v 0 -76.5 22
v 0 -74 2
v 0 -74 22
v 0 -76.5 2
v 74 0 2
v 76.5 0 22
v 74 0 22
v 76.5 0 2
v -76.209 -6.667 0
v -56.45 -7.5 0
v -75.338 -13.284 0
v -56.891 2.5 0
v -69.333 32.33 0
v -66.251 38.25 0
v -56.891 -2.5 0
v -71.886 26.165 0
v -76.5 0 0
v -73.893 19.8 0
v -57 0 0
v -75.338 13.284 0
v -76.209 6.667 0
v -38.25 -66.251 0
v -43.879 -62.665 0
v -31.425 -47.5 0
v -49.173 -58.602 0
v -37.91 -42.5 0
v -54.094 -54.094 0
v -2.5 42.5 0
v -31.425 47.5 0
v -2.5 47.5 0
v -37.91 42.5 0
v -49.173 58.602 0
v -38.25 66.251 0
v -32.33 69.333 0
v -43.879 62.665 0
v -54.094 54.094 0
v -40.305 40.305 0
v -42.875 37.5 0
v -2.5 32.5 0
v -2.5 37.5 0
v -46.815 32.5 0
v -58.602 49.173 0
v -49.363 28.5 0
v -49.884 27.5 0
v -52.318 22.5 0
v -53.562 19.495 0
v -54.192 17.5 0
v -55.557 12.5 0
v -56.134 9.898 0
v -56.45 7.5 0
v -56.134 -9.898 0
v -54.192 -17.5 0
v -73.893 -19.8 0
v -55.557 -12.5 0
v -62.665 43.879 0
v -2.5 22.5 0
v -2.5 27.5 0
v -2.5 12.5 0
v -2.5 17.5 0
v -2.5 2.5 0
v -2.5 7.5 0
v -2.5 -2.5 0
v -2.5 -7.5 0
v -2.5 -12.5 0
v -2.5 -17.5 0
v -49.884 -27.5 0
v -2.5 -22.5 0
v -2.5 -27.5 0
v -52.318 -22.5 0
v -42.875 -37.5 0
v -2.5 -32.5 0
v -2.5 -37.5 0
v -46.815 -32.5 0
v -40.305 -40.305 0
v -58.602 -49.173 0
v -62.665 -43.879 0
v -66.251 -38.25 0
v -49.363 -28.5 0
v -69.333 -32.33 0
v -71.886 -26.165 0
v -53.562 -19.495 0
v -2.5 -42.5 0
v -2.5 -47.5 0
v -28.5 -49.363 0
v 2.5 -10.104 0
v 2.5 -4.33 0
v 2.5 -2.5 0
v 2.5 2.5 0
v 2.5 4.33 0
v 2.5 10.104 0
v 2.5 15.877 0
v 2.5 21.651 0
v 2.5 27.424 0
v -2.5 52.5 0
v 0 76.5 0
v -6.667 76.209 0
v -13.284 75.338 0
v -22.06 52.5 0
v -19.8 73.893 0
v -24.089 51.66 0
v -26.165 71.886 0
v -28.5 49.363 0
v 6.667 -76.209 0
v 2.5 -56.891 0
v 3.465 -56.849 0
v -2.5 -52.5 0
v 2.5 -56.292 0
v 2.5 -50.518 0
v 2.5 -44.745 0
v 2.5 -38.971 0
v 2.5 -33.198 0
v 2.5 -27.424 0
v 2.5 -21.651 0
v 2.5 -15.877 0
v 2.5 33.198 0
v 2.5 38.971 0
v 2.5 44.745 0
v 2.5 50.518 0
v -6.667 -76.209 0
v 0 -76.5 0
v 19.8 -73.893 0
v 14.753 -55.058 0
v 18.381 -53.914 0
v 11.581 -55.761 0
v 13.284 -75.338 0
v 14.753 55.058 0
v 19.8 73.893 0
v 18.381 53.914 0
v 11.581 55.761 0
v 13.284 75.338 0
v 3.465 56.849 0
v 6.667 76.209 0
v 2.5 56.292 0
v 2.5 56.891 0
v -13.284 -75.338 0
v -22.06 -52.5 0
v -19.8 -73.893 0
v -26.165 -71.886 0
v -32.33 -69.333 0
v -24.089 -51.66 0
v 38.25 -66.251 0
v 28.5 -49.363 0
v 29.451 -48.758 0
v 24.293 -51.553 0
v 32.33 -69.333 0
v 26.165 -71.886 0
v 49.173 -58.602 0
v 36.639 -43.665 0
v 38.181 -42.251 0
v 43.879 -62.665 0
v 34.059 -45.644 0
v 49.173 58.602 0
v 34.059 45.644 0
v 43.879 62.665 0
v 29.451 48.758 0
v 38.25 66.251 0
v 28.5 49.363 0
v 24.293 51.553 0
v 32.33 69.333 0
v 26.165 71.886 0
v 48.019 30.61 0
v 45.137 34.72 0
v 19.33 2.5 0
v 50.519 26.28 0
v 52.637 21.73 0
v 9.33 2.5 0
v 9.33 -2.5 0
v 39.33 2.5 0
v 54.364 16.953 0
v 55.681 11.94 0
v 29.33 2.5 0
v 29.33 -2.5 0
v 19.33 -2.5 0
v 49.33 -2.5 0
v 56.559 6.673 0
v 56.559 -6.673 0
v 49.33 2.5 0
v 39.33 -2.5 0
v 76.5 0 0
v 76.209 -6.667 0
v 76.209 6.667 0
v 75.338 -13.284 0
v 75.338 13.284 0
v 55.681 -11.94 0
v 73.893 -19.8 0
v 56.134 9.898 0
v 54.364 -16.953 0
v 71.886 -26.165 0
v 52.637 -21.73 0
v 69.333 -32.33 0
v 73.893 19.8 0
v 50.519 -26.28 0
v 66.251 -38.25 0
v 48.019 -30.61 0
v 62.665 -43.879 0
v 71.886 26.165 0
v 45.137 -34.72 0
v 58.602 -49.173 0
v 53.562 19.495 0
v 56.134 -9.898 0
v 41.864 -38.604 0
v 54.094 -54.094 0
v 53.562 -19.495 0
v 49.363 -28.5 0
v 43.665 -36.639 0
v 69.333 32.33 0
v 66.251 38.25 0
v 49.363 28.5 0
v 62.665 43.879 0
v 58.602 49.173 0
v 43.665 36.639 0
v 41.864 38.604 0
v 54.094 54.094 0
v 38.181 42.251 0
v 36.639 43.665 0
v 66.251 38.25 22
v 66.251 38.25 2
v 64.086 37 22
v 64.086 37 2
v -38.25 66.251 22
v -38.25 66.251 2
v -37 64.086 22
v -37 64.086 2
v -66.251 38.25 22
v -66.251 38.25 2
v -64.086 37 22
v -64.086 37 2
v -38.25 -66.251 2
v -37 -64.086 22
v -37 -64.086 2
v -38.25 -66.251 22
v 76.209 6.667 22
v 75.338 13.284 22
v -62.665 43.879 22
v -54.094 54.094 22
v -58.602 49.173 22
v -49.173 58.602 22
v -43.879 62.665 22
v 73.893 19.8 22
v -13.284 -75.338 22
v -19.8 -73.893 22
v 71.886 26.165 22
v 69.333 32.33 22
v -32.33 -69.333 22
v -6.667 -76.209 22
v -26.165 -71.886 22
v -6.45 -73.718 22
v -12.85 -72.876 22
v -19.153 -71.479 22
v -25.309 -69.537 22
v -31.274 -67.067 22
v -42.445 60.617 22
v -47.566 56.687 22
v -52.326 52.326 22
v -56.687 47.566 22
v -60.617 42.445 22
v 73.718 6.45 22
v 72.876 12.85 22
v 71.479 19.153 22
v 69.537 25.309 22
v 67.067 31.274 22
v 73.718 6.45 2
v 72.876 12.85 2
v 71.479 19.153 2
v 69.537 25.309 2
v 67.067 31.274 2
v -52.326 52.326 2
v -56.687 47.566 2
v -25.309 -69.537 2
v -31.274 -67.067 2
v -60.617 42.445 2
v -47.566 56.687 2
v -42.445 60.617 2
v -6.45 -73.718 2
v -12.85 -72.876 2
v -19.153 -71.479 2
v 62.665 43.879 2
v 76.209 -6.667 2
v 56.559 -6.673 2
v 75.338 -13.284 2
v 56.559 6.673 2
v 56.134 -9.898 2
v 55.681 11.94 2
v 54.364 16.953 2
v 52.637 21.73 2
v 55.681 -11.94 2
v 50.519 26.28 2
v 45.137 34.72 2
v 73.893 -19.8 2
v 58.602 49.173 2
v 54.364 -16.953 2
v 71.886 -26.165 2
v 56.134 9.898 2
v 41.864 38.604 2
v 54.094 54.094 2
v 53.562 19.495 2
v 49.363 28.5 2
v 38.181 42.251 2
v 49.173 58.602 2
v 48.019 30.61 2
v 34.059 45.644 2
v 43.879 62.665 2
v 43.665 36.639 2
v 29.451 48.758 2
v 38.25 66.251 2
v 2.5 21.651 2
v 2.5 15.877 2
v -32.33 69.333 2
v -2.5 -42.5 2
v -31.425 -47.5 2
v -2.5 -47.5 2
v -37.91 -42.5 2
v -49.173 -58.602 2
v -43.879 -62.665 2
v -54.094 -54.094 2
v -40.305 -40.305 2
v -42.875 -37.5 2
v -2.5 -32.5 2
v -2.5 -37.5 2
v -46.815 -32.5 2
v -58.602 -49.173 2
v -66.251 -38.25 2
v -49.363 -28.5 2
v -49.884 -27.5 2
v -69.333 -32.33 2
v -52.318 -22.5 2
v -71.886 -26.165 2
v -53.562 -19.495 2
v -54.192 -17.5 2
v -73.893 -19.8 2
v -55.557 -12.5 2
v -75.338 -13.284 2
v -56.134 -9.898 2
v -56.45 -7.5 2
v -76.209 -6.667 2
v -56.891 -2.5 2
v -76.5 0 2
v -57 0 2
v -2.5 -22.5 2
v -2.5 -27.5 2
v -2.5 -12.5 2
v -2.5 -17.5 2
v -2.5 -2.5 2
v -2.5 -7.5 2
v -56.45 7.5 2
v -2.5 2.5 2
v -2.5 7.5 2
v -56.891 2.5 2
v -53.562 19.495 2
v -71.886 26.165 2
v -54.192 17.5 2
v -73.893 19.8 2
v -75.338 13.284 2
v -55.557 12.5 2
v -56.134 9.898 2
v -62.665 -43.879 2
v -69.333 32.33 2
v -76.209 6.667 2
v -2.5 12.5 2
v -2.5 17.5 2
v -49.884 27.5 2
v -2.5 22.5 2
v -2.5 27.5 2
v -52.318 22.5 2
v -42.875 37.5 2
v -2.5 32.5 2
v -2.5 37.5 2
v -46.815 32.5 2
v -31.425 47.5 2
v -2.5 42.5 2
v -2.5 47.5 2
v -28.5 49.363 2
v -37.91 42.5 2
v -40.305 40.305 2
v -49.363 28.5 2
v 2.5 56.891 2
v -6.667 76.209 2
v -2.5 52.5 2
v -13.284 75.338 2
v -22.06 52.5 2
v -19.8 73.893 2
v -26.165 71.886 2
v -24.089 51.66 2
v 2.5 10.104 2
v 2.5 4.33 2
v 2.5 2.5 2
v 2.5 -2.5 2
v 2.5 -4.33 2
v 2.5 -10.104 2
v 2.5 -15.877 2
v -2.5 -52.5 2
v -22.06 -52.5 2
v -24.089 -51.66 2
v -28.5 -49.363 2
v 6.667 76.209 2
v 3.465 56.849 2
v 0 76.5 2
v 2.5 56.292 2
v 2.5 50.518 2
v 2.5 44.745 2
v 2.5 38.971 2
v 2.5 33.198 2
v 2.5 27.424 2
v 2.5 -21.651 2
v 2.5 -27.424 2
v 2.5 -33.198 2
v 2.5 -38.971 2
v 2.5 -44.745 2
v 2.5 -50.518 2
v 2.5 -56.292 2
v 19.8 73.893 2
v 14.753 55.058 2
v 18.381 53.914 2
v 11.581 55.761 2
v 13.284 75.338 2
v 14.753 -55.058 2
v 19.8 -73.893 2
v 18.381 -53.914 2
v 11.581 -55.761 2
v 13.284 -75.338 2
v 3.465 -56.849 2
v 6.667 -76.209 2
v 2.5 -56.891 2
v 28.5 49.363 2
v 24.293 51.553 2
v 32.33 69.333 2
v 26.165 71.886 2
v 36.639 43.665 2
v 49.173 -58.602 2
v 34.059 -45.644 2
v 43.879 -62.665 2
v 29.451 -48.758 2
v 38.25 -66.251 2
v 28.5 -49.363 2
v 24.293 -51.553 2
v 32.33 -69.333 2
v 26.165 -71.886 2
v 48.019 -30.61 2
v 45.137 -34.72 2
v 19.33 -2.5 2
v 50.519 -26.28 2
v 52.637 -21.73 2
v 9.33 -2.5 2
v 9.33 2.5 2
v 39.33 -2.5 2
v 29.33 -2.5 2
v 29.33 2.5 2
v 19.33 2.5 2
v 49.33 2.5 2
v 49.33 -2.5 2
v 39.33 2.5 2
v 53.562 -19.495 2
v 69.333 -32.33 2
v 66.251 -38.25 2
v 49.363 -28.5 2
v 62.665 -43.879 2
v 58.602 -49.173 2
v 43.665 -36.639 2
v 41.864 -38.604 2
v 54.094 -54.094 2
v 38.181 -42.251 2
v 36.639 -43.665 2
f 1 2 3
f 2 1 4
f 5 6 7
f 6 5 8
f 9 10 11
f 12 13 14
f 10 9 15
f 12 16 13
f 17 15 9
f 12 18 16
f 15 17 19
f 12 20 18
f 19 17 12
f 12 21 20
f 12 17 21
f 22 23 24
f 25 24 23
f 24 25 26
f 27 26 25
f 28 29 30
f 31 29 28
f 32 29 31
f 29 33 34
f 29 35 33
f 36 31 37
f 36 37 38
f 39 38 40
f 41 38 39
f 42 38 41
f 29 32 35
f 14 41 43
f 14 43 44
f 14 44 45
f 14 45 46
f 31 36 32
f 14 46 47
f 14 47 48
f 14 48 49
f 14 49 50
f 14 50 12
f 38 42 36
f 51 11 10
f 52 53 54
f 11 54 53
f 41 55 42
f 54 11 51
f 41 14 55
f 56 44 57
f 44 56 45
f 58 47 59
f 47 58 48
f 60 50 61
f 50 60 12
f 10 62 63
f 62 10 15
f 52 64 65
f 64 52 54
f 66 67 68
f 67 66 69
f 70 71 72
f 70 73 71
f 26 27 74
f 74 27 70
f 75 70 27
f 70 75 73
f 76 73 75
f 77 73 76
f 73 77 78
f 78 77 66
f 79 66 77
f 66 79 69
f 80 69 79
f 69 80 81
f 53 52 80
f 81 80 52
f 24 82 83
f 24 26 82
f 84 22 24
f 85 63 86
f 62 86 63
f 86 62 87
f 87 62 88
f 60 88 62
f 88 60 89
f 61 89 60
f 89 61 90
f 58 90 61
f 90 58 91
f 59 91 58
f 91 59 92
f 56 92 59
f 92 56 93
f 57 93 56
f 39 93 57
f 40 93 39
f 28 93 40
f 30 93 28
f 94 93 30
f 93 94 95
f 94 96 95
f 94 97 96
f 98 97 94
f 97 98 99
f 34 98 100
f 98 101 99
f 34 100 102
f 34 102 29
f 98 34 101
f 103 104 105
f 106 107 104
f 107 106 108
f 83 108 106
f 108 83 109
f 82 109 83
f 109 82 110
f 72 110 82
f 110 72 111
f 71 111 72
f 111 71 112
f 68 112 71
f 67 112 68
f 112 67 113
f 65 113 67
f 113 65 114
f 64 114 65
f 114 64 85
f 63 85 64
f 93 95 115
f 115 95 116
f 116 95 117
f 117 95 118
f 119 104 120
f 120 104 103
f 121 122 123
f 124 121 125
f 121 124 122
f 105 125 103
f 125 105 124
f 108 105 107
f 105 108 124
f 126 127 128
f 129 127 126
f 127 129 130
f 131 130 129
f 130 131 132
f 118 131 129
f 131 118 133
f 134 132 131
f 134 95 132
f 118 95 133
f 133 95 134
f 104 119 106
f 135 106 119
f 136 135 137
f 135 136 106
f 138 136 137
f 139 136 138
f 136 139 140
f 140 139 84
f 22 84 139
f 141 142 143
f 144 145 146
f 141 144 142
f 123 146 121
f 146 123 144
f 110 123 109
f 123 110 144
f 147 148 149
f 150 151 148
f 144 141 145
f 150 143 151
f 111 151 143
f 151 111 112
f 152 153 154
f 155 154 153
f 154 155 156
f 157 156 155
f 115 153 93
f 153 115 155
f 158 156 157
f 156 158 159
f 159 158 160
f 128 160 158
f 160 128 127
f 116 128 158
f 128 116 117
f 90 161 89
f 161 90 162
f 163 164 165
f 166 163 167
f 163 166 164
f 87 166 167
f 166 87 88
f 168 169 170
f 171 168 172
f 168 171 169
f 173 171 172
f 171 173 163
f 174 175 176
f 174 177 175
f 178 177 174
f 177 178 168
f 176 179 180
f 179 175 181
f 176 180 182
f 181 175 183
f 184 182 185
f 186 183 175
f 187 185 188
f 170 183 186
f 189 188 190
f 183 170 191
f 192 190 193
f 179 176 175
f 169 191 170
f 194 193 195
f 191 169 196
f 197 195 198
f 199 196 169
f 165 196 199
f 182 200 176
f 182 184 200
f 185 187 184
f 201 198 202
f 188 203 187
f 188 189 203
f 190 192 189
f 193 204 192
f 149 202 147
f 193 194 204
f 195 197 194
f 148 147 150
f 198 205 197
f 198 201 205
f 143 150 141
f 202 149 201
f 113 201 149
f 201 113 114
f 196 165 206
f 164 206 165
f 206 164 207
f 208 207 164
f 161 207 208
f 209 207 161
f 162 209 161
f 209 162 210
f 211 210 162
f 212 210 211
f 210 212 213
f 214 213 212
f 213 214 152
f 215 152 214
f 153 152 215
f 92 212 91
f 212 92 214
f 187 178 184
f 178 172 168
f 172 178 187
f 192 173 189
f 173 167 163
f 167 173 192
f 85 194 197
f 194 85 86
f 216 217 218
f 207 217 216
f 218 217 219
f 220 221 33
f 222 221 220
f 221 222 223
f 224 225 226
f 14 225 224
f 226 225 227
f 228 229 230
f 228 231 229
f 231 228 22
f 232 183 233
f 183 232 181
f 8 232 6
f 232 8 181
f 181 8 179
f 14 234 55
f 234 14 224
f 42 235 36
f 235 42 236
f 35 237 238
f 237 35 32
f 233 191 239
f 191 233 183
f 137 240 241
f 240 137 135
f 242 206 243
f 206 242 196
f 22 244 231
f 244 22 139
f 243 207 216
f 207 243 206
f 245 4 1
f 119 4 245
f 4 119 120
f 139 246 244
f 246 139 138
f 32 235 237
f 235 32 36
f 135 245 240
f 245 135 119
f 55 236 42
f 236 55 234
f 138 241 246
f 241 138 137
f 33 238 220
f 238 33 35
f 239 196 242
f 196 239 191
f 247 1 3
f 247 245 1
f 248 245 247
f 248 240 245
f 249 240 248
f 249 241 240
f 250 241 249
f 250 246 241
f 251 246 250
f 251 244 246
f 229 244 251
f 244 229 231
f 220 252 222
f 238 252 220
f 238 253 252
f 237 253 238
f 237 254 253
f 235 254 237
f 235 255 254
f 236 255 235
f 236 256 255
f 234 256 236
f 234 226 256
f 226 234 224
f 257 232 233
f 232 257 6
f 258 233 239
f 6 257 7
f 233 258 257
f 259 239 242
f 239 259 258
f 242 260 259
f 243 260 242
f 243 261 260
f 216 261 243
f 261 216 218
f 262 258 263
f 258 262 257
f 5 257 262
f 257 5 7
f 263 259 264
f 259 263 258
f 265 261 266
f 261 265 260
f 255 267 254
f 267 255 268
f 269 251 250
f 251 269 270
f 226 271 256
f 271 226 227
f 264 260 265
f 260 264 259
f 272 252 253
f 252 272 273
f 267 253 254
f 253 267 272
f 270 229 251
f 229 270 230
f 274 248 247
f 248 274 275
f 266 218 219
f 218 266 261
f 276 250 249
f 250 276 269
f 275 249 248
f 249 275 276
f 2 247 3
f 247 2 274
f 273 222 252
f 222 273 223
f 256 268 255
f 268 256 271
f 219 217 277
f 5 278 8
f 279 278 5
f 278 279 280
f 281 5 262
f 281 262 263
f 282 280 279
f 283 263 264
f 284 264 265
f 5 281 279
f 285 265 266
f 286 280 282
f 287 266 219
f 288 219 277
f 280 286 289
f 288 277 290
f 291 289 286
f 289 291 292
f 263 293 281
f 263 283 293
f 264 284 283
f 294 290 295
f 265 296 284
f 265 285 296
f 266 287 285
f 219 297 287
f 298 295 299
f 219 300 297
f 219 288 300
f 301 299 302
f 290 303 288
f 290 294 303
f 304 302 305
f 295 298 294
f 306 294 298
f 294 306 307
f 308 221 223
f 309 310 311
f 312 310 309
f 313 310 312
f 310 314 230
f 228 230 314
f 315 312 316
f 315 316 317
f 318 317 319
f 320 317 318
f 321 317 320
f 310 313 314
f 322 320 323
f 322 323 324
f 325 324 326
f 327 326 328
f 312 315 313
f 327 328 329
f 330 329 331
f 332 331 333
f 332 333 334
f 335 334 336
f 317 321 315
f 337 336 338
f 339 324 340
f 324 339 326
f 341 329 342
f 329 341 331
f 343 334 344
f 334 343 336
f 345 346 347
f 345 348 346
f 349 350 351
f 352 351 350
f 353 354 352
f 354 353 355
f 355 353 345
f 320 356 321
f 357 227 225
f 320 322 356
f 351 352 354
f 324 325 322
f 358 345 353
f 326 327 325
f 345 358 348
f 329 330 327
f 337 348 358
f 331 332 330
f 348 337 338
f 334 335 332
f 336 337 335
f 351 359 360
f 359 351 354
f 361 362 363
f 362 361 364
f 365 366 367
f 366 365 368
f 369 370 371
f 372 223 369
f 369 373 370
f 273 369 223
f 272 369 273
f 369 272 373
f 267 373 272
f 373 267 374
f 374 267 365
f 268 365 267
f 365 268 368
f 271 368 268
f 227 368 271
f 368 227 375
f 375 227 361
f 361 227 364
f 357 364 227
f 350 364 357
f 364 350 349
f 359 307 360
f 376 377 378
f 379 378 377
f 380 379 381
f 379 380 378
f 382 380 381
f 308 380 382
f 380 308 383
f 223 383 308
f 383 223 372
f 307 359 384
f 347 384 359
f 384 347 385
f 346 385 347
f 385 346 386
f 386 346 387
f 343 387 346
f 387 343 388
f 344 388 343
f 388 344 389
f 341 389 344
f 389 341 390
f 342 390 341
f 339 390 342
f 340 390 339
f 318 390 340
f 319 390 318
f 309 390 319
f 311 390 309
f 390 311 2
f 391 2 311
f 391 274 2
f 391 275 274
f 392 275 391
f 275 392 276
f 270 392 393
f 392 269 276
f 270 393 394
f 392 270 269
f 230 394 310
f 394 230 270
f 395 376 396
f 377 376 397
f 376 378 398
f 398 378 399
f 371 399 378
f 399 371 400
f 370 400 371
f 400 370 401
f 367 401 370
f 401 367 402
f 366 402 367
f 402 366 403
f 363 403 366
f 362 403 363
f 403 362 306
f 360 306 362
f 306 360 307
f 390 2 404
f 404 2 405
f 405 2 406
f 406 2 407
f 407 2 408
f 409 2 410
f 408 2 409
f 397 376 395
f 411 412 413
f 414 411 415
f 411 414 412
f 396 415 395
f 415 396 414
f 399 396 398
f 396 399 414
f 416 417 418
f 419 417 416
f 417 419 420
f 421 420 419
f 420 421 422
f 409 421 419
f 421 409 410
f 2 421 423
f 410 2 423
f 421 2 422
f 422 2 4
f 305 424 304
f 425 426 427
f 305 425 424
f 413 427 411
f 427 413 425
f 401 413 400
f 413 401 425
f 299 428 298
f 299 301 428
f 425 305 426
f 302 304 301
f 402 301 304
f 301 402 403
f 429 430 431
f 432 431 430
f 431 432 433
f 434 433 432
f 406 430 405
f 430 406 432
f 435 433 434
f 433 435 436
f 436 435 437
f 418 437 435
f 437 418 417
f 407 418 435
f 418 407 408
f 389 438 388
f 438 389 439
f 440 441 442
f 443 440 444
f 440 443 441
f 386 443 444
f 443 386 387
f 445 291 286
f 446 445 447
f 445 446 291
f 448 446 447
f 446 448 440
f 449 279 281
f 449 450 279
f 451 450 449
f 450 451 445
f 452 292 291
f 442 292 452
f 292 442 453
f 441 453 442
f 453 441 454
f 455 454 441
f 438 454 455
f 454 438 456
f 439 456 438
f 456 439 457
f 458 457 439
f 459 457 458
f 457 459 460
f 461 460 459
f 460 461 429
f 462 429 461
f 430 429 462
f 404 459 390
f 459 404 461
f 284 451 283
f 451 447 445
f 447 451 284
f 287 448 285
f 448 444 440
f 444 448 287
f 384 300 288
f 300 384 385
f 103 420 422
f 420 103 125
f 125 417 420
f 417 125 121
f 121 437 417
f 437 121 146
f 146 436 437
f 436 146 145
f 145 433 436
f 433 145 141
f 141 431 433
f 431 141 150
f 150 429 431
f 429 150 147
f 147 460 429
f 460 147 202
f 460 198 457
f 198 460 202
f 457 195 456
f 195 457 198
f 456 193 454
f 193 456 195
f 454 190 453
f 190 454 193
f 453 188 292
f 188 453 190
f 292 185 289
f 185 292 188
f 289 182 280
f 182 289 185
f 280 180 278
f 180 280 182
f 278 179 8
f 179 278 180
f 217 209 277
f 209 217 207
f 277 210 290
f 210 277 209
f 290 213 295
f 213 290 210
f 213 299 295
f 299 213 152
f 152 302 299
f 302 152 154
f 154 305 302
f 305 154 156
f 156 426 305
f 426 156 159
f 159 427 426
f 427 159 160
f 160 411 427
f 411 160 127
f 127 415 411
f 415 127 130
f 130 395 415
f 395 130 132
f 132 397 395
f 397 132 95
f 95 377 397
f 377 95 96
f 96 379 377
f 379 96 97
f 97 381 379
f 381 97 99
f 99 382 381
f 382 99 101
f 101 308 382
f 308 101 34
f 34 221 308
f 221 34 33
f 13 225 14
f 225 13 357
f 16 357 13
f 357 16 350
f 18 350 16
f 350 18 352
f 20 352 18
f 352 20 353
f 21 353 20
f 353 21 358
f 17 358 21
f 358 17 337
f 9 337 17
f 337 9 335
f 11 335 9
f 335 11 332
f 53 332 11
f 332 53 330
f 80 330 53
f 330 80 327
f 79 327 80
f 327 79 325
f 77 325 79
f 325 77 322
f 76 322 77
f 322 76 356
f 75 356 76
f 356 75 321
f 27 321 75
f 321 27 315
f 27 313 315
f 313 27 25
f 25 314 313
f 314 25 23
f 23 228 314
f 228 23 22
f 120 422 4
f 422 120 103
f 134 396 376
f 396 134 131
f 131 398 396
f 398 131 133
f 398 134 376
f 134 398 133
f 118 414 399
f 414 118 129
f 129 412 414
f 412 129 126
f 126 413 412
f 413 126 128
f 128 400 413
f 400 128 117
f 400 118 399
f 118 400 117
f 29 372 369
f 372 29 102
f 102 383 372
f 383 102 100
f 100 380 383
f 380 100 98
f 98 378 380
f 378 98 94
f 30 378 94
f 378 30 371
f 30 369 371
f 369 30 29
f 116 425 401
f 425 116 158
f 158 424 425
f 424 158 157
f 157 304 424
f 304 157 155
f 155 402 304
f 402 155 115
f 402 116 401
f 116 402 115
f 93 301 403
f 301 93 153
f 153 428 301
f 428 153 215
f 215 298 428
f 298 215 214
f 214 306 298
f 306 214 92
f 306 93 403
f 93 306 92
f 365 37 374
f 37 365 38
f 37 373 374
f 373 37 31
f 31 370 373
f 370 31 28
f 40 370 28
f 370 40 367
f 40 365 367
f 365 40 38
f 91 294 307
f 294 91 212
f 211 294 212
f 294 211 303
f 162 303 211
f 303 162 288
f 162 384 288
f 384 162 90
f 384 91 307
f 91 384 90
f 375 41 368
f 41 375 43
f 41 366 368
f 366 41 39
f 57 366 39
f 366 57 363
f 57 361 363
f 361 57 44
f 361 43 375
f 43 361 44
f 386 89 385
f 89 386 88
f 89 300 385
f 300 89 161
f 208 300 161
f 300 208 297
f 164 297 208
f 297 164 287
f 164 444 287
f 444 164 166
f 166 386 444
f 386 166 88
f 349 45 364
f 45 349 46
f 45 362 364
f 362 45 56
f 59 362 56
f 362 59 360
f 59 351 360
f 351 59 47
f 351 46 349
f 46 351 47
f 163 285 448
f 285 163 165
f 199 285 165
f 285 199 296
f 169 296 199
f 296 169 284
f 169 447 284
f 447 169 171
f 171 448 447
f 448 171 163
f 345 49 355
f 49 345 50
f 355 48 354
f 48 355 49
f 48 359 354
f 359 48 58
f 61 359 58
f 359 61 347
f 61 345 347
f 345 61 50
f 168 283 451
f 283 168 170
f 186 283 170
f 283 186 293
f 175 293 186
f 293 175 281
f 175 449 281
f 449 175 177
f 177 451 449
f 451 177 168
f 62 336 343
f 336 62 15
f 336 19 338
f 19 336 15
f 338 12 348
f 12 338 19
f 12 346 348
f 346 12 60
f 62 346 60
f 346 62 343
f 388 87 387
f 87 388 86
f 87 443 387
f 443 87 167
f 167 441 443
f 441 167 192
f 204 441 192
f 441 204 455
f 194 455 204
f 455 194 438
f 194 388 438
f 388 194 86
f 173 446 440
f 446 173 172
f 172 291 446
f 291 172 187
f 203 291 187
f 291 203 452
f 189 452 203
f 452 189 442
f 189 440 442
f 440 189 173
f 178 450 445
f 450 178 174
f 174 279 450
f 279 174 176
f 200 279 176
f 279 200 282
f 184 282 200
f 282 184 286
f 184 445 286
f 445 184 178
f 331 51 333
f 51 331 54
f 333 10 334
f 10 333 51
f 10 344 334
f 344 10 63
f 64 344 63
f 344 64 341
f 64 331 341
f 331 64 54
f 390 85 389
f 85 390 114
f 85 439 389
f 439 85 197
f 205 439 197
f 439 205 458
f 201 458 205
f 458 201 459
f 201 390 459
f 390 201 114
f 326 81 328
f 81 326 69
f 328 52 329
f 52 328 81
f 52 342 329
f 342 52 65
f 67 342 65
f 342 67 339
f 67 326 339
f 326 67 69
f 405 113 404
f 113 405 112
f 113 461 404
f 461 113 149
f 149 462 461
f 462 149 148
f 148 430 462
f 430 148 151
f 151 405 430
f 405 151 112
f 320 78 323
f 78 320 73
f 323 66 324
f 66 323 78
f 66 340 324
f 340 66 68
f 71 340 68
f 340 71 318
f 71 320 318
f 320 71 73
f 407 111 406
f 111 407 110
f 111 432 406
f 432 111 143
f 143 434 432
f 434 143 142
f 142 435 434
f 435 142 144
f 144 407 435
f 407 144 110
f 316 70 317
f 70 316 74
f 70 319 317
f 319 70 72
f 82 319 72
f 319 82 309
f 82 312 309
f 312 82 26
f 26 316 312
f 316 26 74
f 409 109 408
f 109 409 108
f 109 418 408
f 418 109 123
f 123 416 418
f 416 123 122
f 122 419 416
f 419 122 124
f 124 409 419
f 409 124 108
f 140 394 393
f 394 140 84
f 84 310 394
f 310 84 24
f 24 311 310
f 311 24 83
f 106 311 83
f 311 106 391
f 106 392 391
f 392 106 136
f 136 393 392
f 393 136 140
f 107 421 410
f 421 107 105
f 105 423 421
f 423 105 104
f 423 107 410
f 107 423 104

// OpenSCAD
/*                                                 -*- c++ -*-
 * A Bahtinov mask generator.
 * Units in mm, default values are for
 * a Celestron NexStar GPS 8.
 *
 * Copyright 2013-2014, Brent Burton
 * License: CC-BY-SA
 *
 * Updated: 2014-06-23
 */
 
/*
 Modified by Eric 2016:
 For installation over the outside of the end of a telescope instead of inside
 Default values are for an Orion XT4.5
*/ 


// This is the diameter of the mask. For this version use the OD of your scope.
outerDiameter = 146; // [80:400]

// The telescope light's path diameter.
aperture = 114; // [80:400]

// Diameter of secondary mirror holder. If no secondary, set to 0.
centerHoleDiameter = 0; // [0:90]

// Width of the gaps and the bars.
gap = 5; // [4:10]

//height of the retaining ring in mm
ringHeight=20;

//thickness of the retaining ring in mm
ringThickness=5;

//number of ring pieces
ringPieces=3; 

//angle of the three pieces in the retaining ring. Use (360/ringPieces) for a solid ring.
ringPiece=30;

//rotate the retaining ring pieces with respect to the mask (in degrees)
ringRotation=0;


/* create a series of bars covering roughly one half of the
 * scope aperture. Located in the +X side.
 */
module bars(gap, width, num=5) {
    num = round(num);
    for (i=[-num:num]) {
        translate([width/2,i*2*gap]) square([width,gap], center=true);
    }
}

module bahtinovBars(gap,width) {
    numBars = aperture/2 / gap / 2 -1;
    // +X +Y bars
    intersection() {
        rotate([0,0,30]) bars(gap, width, numBars);
        square([outerDiameter/2, outerDiameter/2], center=false);
    }
    // +X -Y bars
    intersection() {
        rotate([0,0,-30]) bars(gap, width, numBars);
        translate([0,-outerDiameter/2]) square([outerDiameter/2, outerDiameter/2], center=false);
    }
    // -X bars
    rotate([0,0,180]) bars(gap, width, numBars);
}

$fn=72;
module bahtinov2D() {
    width = aperture/2;
    difference() {                          // overall plate minus center hole
        union() {
            difference() {                  // trims the mask to aperture size
                circle(r=aperture/2+1);
                bahtinovBars(gap,width);
            }
            difference() {                  // makes the outer margin
                circle(r=outerDiameter/2+ringThickness/2+1);  //Eric removed the -1 and replaced with +ringThickness/2+1
                circle(r=aperture/2);
            }
            // Add horizontal and vertical structural bars:
            square([gap,2*(aperture/2+1)], center=true);
            translate([aperture/4,0]) square([aperture/2+1,gap], center=true);
            // Add center hole margin if needed:
            if (centerHoleDiameter > 0 && centerHoleDiameter < outerDiameter) {
                circle(r=(centerHoleDiameter+gap)/2);
            }
        }
        // subtract center hole if needed
        if (centerHoleDiameter > 0 && centerHoleDiameter < outerDiameter) {
            circle(r=centerHoleDiameter/2+1);
        }
    }
}

module pie_slice(r = 10, deg = 30) {
    degn = (deg % 360 > 0) ? deg % 360 : deg % 360;
    echo(degn);
    difference() {
        circle(r);
        if (degn > 180) intersection_for(a = [0, 180 - degn]) rotate(a) translate([-r, 0, 0]) #square(r * 2);
        else union() for(a = [0, 180 - degn]) rotate(a) translate([-r, 0, 0]) square(r * 2);
    }
}


module retainingring(){
    difference(){
    cylinder(h=ringHeight+2,d=outerDiameter+ringThickness+2);
    translate([0,0,-1])cylinder(h=ringHeight+4,d=outerDiameter+2);
    for(angle=[0:360/ringPieces:359]){
        rotate([0,0,angle])
            linear_extrude(height=ringHeight+4)
                pie_slice(r=outerDiameter/2+ringThickness,deg=360/ringPieces-ringPiece);    
        }
    }
}





union() {
    linear_extrude(height=2) bahtinov2D();
    // add a little handle //Eric removed so it would print easier
    //translate([outerDiameter/2-gap,0,0]) cylinder(r=gap/2, h=12);
    
    //add a retaining ring
    rotate([0,0,ringRotation]) retainingring();
    
    
}
